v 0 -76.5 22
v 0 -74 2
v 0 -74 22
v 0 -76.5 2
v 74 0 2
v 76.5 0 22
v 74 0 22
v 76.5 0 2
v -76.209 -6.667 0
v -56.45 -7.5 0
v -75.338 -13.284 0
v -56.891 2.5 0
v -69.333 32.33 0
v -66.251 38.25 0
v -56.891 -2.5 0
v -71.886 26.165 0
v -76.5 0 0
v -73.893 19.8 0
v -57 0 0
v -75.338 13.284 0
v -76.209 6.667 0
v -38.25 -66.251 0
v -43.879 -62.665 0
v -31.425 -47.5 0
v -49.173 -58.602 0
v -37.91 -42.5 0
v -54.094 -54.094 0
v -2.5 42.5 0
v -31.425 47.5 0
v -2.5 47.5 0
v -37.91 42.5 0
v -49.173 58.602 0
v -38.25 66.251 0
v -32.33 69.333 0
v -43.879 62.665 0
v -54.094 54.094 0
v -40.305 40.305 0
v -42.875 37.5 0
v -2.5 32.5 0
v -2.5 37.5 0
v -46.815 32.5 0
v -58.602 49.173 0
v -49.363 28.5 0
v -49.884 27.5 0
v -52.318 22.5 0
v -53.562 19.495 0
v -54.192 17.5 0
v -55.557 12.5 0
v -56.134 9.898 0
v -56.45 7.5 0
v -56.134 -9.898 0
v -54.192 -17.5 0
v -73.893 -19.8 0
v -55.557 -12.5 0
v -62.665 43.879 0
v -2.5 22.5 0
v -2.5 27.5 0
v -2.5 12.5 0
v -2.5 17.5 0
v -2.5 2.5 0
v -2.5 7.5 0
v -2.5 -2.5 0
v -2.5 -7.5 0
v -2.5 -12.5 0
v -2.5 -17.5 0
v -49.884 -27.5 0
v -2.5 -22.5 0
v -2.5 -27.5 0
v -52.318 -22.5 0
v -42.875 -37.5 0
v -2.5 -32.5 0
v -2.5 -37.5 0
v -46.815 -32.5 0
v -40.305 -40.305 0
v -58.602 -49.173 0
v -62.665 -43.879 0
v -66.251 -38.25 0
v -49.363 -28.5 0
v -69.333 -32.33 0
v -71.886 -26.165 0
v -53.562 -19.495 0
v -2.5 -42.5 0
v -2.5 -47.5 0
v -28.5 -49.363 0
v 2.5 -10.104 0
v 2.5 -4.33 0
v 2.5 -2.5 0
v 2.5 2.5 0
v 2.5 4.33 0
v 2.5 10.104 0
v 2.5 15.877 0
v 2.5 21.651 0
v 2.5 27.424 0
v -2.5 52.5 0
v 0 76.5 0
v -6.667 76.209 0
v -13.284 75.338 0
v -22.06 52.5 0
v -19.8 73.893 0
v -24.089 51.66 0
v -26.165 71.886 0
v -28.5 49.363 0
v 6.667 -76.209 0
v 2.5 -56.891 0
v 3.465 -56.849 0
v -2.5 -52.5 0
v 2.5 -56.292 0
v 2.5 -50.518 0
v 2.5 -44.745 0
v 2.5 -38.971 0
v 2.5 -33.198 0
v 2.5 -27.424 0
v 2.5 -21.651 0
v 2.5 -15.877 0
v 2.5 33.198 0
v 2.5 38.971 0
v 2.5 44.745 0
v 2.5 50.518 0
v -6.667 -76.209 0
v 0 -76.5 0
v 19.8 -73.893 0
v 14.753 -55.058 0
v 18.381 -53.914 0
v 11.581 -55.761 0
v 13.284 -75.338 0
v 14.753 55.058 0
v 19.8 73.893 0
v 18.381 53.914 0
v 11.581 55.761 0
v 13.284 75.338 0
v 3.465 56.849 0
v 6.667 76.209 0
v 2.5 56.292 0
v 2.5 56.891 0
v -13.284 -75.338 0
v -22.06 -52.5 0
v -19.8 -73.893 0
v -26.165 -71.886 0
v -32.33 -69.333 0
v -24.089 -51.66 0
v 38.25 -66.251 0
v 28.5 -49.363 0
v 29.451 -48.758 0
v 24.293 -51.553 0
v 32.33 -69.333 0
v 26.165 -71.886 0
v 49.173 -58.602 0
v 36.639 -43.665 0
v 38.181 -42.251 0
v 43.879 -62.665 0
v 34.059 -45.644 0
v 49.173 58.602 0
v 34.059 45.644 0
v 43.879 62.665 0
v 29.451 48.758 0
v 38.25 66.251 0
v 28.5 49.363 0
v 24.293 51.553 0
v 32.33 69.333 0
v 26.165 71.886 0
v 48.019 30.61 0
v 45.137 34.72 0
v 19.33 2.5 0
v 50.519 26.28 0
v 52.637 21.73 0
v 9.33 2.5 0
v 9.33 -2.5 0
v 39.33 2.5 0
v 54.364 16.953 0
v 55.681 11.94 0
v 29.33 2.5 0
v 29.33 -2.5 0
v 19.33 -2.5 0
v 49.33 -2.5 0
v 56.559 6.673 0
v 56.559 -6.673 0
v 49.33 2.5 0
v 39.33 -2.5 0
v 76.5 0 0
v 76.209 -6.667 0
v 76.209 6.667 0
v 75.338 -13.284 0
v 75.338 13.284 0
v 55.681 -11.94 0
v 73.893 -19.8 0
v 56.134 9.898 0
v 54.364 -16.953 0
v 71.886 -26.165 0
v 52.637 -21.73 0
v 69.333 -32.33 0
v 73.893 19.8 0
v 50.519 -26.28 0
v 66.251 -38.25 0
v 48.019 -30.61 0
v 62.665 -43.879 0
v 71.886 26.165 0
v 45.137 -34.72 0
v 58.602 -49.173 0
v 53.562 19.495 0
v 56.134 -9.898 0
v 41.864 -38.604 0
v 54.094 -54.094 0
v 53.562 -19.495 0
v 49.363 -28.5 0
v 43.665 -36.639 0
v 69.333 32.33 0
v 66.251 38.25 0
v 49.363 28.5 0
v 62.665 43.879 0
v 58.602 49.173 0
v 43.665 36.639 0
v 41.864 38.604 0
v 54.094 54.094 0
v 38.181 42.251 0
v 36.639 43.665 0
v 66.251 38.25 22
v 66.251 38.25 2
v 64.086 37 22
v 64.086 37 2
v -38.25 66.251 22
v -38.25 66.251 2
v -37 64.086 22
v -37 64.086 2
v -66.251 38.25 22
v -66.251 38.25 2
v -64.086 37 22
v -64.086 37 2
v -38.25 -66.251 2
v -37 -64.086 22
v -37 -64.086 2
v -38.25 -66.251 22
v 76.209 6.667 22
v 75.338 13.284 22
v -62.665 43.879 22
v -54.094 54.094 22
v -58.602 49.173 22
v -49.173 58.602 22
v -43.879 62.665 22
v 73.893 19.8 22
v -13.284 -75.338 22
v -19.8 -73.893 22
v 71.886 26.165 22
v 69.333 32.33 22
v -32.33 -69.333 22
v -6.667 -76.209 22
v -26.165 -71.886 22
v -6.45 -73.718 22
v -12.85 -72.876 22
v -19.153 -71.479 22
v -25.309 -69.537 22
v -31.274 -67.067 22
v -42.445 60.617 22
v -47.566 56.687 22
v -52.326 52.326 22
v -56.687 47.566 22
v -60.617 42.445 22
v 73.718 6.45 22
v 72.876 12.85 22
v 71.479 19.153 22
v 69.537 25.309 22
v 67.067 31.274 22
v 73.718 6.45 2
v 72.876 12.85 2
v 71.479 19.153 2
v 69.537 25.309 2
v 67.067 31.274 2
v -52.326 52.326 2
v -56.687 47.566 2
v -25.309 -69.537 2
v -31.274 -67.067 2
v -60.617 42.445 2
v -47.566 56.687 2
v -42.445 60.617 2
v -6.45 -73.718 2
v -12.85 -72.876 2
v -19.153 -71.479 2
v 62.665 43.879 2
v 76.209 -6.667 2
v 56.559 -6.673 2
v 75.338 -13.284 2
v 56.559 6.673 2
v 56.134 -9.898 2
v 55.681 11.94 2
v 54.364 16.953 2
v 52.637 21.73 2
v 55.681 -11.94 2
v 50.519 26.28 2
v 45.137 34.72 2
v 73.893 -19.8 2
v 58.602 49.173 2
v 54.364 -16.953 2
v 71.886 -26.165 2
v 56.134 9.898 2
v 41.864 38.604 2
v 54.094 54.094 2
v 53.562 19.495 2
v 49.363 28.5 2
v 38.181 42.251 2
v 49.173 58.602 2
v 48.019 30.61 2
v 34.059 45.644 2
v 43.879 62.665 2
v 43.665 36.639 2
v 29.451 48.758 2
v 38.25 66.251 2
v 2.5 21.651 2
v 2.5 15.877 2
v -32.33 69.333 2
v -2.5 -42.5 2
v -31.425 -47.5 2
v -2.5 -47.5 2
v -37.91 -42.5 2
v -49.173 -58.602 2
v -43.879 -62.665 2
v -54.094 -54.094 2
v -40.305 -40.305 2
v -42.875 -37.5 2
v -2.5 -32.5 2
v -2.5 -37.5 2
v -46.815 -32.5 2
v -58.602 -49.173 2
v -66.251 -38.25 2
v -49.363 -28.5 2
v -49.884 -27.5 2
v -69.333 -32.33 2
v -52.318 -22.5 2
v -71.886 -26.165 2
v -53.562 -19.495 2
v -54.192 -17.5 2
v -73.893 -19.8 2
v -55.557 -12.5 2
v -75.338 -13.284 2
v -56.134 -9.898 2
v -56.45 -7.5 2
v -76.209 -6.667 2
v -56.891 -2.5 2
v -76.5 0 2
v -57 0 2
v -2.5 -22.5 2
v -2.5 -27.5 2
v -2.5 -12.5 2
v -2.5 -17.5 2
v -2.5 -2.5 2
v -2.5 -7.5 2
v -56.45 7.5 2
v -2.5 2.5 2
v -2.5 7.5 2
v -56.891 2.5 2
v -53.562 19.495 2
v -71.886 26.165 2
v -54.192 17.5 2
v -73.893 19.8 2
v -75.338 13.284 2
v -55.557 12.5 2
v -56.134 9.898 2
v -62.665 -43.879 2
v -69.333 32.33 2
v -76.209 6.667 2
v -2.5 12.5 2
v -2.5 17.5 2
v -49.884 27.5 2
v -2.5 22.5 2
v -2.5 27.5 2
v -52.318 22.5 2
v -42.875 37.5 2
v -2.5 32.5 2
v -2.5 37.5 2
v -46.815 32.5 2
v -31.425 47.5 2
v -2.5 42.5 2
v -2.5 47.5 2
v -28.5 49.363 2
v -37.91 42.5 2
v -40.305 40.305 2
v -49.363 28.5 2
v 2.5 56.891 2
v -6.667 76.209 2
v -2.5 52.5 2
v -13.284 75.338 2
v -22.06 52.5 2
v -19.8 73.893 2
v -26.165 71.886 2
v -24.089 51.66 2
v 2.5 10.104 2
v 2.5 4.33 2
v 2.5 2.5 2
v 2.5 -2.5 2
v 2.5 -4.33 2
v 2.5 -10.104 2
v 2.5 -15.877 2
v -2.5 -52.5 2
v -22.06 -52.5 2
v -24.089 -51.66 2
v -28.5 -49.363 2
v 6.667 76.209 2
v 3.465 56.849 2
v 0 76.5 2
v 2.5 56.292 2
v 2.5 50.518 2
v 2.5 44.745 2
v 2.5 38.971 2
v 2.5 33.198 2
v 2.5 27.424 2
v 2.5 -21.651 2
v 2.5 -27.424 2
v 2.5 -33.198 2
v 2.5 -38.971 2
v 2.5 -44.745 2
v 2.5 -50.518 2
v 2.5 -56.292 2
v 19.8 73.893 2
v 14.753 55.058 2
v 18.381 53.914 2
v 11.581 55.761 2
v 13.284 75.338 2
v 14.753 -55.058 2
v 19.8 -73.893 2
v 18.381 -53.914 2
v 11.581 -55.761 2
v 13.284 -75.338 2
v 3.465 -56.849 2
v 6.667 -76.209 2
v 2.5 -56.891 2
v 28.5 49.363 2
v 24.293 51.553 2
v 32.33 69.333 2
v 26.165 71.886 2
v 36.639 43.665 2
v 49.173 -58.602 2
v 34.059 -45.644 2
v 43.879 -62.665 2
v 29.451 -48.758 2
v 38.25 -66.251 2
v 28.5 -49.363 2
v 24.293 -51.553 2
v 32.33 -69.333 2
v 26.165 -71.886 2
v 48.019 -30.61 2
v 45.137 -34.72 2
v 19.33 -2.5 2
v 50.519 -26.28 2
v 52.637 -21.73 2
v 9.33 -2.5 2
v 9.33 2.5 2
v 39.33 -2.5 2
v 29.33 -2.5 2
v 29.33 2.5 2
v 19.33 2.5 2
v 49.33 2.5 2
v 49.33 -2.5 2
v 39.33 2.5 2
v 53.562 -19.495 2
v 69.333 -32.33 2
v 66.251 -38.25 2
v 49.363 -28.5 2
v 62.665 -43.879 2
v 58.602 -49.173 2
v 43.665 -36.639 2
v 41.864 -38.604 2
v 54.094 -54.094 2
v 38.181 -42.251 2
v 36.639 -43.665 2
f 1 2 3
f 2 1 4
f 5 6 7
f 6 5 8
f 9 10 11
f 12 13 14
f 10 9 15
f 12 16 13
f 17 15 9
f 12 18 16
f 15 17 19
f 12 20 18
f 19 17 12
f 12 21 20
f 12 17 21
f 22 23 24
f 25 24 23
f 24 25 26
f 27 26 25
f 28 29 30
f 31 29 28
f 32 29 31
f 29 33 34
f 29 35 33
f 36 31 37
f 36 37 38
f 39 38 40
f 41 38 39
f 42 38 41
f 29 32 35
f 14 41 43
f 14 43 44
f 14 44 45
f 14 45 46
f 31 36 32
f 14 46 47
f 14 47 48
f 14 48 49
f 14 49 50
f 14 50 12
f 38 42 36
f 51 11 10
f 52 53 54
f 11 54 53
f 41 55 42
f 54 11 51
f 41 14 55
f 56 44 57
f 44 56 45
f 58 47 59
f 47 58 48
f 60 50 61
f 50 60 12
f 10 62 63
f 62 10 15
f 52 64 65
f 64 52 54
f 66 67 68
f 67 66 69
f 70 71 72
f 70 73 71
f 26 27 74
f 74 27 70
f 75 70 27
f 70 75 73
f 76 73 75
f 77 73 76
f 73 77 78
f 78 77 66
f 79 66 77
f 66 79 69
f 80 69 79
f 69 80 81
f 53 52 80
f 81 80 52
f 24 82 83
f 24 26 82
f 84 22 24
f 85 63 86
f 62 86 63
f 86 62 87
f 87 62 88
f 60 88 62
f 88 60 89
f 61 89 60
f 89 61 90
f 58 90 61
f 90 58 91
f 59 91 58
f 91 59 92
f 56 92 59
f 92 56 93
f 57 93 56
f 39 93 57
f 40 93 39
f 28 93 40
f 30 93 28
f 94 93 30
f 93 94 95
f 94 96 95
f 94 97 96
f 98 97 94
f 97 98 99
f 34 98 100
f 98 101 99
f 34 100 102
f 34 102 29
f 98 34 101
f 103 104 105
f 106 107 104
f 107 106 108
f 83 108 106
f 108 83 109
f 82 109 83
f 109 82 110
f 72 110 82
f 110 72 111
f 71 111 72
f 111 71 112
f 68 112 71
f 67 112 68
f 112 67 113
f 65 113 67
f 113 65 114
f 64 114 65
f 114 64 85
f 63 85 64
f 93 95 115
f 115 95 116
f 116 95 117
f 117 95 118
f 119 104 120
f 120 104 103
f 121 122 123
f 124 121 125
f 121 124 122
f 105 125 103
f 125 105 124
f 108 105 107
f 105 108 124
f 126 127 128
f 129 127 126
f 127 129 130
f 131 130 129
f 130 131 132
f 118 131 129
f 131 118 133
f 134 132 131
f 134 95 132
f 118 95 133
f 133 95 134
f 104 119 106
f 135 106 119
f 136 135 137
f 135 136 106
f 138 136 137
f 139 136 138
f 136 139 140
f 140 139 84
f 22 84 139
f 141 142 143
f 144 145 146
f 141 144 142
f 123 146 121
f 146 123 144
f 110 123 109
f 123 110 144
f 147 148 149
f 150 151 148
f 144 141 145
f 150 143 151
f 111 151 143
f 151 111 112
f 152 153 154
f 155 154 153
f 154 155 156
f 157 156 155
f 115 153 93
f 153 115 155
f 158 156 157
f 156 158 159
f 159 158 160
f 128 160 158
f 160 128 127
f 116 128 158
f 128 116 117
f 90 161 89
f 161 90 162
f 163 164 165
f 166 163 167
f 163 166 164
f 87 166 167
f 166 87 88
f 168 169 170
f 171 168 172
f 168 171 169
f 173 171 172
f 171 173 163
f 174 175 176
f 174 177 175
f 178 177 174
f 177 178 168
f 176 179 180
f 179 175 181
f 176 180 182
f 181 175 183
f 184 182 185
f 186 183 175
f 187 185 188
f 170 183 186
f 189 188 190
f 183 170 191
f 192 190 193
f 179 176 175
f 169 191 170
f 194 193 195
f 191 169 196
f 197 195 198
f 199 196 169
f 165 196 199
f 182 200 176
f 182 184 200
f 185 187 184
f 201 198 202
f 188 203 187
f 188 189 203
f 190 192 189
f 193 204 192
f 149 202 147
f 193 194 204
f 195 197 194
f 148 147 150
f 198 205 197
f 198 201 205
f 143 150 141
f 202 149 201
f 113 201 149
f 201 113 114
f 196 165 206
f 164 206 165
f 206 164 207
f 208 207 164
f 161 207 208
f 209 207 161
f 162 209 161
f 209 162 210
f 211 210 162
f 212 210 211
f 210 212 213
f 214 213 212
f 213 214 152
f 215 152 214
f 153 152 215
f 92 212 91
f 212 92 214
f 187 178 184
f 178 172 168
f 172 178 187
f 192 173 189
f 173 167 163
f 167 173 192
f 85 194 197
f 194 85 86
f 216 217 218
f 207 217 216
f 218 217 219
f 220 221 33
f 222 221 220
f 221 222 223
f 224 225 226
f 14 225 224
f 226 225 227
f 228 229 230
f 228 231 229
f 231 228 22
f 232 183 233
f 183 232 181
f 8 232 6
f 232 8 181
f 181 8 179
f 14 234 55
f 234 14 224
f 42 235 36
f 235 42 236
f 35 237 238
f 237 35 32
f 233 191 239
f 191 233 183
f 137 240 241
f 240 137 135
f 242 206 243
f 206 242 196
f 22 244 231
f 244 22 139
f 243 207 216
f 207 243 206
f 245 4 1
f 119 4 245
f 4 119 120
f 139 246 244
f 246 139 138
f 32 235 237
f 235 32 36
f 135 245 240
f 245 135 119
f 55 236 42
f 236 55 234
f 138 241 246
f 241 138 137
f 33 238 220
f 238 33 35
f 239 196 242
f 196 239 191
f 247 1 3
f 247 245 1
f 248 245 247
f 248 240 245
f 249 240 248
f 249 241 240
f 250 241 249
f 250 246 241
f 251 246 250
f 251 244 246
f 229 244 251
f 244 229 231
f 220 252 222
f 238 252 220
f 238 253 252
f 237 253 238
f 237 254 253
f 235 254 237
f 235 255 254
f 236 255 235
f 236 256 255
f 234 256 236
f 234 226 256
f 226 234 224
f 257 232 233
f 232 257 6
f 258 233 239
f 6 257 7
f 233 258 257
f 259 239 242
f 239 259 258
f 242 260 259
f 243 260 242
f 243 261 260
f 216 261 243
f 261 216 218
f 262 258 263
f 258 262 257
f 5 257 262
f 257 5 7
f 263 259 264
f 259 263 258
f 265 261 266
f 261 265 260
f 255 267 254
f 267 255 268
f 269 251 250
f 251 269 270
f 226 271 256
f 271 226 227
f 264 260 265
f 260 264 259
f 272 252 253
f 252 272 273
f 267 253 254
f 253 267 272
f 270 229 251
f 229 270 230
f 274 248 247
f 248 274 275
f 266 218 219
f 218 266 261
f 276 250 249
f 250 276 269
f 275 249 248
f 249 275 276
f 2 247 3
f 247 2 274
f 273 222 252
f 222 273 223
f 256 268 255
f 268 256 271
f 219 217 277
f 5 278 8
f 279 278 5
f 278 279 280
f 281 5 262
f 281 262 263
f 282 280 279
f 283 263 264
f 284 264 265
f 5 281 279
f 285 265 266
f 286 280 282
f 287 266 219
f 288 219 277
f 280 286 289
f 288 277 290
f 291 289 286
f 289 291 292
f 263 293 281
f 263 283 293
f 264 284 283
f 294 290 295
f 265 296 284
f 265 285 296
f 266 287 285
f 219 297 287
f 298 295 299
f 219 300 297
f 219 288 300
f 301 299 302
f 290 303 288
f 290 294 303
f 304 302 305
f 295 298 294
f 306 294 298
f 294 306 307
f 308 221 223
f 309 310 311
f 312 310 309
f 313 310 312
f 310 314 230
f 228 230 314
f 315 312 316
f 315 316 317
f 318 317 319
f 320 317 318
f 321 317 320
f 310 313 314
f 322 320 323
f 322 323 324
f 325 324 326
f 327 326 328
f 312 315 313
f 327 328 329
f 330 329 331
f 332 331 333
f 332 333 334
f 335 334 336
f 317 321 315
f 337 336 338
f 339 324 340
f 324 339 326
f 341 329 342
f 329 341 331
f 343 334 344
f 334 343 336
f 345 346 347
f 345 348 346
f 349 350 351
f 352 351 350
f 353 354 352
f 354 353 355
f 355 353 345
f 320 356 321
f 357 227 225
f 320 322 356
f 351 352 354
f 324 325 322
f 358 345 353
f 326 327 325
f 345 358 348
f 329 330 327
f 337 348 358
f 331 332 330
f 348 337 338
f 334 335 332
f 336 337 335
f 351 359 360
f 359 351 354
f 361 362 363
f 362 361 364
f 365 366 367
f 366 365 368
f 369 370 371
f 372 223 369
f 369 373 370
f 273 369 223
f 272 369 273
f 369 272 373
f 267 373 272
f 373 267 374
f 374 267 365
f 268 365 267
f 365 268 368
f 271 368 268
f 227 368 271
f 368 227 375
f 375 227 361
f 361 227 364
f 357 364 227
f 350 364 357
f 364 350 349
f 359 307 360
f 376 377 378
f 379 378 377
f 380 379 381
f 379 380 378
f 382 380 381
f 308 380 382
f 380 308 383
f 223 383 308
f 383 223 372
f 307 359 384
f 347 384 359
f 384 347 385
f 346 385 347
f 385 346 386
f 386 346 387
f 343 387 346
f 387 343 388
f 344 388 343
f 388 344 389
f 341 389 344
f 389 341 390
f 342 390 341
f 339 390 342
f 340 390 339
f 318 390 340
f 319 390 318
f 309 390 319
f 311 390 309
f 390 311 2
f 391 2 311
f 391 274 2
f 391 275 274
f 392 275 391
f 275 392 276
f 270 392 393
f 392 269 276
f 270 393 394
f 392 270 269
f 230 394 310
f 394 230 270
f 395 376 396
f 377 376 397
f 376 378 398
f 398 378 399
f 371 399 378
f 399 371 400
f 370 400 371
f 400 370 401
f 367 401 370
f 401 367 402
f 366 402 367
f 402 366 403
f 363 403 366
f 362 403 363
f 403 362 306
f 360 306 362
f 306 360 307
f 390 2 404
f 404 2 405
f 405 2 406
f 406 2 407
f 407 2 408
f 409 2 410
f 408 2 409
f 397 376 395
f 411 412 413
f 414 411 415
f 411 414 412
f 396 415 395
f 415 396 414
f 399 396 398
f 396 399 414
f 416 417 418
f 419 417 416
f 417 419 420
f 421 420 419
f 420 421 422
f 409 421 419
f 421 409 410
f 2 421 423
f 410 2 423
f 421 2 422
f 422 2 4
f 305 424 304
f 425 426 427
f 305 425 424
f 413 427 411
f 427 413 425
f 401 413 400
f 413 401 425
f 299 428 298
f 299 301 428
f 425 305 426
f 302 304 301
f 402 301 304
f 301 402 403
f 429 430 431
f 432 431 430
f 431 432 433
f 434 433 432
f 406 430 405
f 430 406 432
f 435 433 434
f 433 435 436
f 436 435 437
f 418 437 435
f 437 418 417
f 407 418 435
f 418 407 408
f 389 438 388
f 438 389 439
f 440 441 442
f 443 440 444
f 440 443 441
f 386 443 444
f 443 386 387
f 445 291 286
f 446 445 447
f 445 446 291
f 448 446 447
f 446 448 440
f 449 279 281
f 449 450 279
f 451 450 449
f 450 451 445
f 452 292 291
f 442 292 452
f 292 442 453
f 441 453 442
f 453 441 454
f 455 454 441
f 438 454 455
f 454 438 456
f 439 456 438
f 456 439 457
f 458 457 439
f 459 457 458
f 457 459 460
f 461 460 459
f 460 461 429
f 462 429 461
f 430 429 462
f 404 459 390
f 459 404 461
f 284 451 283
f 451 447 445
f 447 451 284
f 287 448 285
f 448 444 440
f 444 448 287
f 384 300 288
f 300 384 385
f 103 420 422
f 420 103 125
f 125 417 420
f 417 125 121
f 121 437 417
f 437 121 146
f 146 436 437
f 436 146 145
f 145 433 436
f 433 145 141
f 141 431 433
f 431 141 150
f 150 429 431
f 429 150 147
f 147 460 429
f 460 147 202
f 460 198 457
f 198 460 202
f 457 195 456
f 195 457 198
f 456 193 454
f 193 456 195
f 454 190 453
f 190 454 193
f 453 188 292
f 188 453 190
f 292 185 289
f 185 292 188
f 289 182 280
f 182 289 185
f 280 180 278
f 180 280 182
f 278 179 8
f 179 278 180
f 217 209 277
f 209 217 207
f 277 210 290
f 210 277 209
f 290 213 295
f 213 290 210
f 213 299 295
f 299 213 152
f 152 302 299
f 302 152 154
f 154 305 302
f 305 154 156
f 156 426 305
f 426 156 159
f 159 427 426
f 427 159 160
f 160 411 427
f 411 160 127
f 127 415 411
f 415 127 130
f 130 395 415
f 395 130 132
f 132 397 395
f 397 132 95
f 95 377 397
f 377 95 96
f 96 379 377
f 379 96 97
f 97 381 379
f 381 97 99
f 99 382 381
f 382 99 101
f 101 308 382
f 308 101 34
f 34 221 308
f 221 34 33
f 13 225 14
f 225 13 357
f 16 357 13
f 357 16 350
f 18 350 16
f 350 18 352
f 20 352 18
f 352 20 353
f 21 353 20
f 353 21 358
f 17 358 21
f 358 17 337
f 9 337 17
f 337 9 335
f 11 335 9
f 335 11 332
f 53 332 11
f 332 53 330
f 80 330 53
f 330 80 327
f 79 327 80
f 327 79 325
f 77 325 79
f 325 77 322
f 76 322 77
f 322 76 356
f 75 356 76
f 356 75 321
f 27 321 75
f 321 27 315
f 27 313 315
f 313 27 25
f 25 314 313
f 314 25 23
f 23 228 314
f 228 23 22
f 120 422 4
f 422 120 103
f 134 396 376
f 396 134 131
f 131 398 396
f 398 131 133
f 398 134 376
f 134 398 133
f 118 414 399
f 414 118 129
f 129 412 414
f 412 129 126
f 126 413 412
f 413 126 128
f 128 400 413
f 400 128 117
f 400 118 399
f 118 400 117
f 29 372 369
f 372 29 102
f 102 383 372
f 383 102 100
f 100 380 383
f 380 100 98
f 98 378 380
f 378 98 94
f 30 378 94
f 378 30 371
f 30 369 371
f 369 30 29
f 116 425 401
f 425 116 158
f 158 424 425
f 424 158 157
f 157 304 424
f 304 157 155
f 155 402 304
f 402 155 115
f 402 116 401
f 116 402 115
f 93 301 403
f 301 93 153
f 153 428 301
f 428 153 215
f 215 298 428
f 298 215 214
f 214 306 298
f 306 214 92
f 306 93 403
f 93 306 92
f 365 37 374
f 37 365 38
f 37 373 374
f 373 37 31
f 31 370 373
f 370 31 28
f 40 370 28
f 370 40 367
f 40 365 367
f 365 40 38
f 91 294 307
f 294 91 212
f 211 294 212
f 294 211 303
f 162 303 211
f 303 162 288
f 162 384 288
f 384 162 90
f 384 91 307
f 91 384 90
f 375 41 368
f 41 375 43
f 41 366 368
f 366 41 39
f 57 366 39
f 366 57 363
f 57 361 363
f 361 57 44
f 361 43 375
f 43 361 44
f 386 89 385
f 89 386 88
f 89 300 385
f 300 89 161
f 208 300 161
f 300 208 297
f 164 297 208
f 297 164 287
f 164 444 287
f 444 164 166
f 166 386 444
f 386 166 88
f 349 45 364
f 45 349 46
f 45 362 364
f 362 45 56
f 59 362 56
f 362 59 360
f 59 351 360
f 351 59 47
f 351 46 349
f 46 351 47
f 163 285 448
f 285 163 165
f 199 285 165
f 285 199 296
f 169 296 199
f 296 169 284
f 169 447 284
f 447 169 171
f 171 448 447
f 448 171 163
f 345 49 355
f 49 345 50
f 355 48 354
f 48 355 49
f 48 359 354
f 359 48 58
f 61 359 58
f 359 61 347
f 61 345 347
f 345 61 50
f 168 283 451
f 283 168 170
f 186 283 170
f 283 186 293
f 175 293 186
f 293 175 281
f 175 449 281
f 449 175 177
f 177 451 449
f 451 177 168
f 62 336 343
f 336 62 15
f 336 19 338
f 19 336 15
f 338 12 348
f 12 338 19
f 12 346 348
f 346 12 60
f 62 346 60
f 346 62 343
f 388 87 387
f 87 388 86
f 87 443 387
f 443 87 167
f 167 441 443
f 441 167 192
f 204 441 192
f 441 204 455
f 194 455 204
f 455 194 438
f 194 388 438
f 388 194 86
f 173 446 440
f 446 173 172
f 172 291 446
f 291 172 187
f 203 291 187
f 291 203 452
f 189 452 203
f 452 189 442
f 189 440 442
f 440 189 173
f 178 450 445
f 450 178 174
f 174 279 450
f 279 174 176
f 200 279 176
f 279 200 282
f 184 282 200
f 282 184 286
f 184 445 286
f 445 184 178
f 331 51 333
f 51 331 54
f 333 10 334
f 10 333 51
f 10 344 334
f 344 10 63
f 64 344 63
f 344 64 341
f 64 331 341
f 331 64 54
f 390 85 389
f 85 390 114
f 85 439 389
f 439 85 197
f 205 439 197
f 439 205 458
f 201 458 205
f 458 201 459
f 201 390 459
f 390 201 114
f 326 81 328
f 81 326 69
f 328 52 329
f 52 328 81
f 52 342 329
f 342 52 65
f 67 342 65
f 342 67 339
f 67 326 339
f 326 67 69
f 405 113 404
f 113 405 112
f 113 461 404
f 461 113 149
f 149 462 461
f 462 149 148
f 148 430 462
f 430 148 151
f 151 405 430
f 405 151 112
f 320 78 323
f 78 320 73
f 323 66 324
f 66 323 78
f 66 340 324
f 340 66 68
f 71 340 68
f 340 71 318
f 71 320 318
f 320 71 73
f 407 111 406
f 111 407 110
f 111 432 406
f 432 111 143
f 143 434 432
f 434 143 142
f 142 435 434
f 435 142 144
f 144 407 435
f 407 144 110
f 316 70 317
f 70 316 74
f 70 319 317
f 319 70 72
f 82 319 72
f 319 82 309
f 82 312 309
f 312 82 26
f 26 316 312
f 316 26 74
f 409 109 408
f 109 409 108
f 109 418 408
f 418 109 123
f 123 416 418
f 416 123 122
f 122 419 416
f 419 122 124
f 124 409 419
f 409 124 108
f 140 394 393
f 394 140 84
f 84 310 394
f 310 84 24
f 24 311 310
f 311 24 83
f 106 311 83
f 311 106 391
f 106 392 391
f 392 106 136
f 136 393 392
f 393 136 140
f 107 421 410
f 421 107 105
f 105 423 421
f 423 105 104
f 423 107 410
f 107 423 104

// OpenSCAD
/*                                                 -*- c++ -*-
 * A Bahtinov mask generator.
 * Units in mm, default values are for
 * a Celestron NexStar GPS 8.
 *
 * Copyright 2013-2014, Brent Burton
 * License: CC-BY-SA
 *
 * Updated: 2014-06-23
 */
 
/*
 Modified by Eric 2016:
 For installation over the outside of the end of a telescope instead of inside
 Default values are for an Orion XT4.5
*/ 


// This is the diameter of the mask. For this version use the OD of your scope.
outerDiameter = 146; // [80:400]

// The telescope light's path diameter.
aperture = 114; // [80:400]

// Diameter of secondary mirror holder. If no secondary, set to 0.
centerHoleDiameter = 0; // [0:90]

// Width of the gaps and the bars.
gap = 5; // [4:10]

//height of the retaining ring in mm
ringHeight=20;

//thickness of the retaining ring in mm
ringThickness=5;

//number of ring pieces
ringPieces=3; 

//angle of the three pieces in the retaining ring. Use (360/ringPieces) for a solid ring.
ringPiece=30;

//rotate the retaining ring pieces with respect to the mask (in degrees)
ringRotation=0;


/* create a series of bars covering roughly one half of the
 * scope aperture. Located in the +X side.
 */
module bars(gap, width, num=5) {
    num = round(num);
    for (i=[-num:num]) {
        translate([width/2,i*2*gap]) square([width,gap], center=true);
    }
}

module bahtinovBars(gap,width) {
    numBars = aperture/2 / gap / 2 -1;
    // +X +Y bars
    intersection() {
        rotate([0,0,30]) bars(gap, width, numBars);
        square([outerDiameter/2, outerDiameter/2], center=false);
    }
    // +X -Y bars
    intersection() {
        rotate([0,0,-30]) bars(gap, width, numBars);
        translate([0,-outerDiameter/2]) square([outerDiameter/2, outerDiameter/2], center=false);
    }
    // -X bars
    rotate([0,0,180]) bars(gap, width, numBars);
}

$fn=72;
module bahtinov2D() {
    width = aperture/2;
    difference() {                          // overall plate minus center hole
        union() {
            difference() {                  // trims the mask to aperture size
                circle(r=aperture/2+1);
                bahtinovBars(gap,width);
            }
            difference() {                  // makes the outer margin
                circle(r=outerDiameter/2+ringThickness/2+1);  //Eric removed the -1 and replaced with +ringThickness/2+1
                circle(r=aperture/2);
            }
            // Add horizontal and vertical structural bars:
            square([gap,2*(aperture/2+1)], center=true);
            translate([aperture/4,0]) square([aperture/2+1,gap], center=true);
            // Add center hole margin if needed:
            if (centerHoleDiameter > 0 && centerHoleDiameter < outerDiameter) {
                circle(r=(centerHoleDiameter+gap)/2);
            }
        }
        // subtract center hole if needed
        if (centerHoleDiameter > 0 && centerHoleDiameter < outerDiameter) {
            circle(r=centerHoleDiameter/2+1);
        }
    }
}

module pie_slice(r = 10, deg = 30) {
    degn = (deg % 360 > 0) ? deg % 360 : deg % 360;
    echo(degn);
    difference() {
        circle(r);
        if (degn > 180) intersection_for(a = [0, 180 - degn]) rotate(a) translate([-r, 0, 0]) #square(r * 2);
        else union() for(a = [0, 180 - degn]) rotate(a) translate([-r, 0, 0]) square(r * 2);
    }
}


module retainingring(){
    difference(){
    cylinder(h=ringHeight+2,d=outerDiameter+ringThickness+2);
    translate([0,0,-1])cylinder(h=ringHeight+4,d=outerDiameter+2);
    for(angle=[0:360/ringPieces:359]){
        rotate([0,0,angle])
            linear_extrude(height=ringHeight+4)
                pie_slice(r=outerDiameter/2+ringThickness,deg=360/ringPieces-ringPiece);    
        }
    }
}





union() {
    linear_extrude(height=2) bahtinov2D();
    // add a little handle //Eric removed so it would print easier
    //translate([outerDiameter/2-gap,0,0]) cylinder(r=gap/2, h=12);
    
    //add a retaining ring
    rotate([0,0,ringRotation]) retainingring();
    
    
}
